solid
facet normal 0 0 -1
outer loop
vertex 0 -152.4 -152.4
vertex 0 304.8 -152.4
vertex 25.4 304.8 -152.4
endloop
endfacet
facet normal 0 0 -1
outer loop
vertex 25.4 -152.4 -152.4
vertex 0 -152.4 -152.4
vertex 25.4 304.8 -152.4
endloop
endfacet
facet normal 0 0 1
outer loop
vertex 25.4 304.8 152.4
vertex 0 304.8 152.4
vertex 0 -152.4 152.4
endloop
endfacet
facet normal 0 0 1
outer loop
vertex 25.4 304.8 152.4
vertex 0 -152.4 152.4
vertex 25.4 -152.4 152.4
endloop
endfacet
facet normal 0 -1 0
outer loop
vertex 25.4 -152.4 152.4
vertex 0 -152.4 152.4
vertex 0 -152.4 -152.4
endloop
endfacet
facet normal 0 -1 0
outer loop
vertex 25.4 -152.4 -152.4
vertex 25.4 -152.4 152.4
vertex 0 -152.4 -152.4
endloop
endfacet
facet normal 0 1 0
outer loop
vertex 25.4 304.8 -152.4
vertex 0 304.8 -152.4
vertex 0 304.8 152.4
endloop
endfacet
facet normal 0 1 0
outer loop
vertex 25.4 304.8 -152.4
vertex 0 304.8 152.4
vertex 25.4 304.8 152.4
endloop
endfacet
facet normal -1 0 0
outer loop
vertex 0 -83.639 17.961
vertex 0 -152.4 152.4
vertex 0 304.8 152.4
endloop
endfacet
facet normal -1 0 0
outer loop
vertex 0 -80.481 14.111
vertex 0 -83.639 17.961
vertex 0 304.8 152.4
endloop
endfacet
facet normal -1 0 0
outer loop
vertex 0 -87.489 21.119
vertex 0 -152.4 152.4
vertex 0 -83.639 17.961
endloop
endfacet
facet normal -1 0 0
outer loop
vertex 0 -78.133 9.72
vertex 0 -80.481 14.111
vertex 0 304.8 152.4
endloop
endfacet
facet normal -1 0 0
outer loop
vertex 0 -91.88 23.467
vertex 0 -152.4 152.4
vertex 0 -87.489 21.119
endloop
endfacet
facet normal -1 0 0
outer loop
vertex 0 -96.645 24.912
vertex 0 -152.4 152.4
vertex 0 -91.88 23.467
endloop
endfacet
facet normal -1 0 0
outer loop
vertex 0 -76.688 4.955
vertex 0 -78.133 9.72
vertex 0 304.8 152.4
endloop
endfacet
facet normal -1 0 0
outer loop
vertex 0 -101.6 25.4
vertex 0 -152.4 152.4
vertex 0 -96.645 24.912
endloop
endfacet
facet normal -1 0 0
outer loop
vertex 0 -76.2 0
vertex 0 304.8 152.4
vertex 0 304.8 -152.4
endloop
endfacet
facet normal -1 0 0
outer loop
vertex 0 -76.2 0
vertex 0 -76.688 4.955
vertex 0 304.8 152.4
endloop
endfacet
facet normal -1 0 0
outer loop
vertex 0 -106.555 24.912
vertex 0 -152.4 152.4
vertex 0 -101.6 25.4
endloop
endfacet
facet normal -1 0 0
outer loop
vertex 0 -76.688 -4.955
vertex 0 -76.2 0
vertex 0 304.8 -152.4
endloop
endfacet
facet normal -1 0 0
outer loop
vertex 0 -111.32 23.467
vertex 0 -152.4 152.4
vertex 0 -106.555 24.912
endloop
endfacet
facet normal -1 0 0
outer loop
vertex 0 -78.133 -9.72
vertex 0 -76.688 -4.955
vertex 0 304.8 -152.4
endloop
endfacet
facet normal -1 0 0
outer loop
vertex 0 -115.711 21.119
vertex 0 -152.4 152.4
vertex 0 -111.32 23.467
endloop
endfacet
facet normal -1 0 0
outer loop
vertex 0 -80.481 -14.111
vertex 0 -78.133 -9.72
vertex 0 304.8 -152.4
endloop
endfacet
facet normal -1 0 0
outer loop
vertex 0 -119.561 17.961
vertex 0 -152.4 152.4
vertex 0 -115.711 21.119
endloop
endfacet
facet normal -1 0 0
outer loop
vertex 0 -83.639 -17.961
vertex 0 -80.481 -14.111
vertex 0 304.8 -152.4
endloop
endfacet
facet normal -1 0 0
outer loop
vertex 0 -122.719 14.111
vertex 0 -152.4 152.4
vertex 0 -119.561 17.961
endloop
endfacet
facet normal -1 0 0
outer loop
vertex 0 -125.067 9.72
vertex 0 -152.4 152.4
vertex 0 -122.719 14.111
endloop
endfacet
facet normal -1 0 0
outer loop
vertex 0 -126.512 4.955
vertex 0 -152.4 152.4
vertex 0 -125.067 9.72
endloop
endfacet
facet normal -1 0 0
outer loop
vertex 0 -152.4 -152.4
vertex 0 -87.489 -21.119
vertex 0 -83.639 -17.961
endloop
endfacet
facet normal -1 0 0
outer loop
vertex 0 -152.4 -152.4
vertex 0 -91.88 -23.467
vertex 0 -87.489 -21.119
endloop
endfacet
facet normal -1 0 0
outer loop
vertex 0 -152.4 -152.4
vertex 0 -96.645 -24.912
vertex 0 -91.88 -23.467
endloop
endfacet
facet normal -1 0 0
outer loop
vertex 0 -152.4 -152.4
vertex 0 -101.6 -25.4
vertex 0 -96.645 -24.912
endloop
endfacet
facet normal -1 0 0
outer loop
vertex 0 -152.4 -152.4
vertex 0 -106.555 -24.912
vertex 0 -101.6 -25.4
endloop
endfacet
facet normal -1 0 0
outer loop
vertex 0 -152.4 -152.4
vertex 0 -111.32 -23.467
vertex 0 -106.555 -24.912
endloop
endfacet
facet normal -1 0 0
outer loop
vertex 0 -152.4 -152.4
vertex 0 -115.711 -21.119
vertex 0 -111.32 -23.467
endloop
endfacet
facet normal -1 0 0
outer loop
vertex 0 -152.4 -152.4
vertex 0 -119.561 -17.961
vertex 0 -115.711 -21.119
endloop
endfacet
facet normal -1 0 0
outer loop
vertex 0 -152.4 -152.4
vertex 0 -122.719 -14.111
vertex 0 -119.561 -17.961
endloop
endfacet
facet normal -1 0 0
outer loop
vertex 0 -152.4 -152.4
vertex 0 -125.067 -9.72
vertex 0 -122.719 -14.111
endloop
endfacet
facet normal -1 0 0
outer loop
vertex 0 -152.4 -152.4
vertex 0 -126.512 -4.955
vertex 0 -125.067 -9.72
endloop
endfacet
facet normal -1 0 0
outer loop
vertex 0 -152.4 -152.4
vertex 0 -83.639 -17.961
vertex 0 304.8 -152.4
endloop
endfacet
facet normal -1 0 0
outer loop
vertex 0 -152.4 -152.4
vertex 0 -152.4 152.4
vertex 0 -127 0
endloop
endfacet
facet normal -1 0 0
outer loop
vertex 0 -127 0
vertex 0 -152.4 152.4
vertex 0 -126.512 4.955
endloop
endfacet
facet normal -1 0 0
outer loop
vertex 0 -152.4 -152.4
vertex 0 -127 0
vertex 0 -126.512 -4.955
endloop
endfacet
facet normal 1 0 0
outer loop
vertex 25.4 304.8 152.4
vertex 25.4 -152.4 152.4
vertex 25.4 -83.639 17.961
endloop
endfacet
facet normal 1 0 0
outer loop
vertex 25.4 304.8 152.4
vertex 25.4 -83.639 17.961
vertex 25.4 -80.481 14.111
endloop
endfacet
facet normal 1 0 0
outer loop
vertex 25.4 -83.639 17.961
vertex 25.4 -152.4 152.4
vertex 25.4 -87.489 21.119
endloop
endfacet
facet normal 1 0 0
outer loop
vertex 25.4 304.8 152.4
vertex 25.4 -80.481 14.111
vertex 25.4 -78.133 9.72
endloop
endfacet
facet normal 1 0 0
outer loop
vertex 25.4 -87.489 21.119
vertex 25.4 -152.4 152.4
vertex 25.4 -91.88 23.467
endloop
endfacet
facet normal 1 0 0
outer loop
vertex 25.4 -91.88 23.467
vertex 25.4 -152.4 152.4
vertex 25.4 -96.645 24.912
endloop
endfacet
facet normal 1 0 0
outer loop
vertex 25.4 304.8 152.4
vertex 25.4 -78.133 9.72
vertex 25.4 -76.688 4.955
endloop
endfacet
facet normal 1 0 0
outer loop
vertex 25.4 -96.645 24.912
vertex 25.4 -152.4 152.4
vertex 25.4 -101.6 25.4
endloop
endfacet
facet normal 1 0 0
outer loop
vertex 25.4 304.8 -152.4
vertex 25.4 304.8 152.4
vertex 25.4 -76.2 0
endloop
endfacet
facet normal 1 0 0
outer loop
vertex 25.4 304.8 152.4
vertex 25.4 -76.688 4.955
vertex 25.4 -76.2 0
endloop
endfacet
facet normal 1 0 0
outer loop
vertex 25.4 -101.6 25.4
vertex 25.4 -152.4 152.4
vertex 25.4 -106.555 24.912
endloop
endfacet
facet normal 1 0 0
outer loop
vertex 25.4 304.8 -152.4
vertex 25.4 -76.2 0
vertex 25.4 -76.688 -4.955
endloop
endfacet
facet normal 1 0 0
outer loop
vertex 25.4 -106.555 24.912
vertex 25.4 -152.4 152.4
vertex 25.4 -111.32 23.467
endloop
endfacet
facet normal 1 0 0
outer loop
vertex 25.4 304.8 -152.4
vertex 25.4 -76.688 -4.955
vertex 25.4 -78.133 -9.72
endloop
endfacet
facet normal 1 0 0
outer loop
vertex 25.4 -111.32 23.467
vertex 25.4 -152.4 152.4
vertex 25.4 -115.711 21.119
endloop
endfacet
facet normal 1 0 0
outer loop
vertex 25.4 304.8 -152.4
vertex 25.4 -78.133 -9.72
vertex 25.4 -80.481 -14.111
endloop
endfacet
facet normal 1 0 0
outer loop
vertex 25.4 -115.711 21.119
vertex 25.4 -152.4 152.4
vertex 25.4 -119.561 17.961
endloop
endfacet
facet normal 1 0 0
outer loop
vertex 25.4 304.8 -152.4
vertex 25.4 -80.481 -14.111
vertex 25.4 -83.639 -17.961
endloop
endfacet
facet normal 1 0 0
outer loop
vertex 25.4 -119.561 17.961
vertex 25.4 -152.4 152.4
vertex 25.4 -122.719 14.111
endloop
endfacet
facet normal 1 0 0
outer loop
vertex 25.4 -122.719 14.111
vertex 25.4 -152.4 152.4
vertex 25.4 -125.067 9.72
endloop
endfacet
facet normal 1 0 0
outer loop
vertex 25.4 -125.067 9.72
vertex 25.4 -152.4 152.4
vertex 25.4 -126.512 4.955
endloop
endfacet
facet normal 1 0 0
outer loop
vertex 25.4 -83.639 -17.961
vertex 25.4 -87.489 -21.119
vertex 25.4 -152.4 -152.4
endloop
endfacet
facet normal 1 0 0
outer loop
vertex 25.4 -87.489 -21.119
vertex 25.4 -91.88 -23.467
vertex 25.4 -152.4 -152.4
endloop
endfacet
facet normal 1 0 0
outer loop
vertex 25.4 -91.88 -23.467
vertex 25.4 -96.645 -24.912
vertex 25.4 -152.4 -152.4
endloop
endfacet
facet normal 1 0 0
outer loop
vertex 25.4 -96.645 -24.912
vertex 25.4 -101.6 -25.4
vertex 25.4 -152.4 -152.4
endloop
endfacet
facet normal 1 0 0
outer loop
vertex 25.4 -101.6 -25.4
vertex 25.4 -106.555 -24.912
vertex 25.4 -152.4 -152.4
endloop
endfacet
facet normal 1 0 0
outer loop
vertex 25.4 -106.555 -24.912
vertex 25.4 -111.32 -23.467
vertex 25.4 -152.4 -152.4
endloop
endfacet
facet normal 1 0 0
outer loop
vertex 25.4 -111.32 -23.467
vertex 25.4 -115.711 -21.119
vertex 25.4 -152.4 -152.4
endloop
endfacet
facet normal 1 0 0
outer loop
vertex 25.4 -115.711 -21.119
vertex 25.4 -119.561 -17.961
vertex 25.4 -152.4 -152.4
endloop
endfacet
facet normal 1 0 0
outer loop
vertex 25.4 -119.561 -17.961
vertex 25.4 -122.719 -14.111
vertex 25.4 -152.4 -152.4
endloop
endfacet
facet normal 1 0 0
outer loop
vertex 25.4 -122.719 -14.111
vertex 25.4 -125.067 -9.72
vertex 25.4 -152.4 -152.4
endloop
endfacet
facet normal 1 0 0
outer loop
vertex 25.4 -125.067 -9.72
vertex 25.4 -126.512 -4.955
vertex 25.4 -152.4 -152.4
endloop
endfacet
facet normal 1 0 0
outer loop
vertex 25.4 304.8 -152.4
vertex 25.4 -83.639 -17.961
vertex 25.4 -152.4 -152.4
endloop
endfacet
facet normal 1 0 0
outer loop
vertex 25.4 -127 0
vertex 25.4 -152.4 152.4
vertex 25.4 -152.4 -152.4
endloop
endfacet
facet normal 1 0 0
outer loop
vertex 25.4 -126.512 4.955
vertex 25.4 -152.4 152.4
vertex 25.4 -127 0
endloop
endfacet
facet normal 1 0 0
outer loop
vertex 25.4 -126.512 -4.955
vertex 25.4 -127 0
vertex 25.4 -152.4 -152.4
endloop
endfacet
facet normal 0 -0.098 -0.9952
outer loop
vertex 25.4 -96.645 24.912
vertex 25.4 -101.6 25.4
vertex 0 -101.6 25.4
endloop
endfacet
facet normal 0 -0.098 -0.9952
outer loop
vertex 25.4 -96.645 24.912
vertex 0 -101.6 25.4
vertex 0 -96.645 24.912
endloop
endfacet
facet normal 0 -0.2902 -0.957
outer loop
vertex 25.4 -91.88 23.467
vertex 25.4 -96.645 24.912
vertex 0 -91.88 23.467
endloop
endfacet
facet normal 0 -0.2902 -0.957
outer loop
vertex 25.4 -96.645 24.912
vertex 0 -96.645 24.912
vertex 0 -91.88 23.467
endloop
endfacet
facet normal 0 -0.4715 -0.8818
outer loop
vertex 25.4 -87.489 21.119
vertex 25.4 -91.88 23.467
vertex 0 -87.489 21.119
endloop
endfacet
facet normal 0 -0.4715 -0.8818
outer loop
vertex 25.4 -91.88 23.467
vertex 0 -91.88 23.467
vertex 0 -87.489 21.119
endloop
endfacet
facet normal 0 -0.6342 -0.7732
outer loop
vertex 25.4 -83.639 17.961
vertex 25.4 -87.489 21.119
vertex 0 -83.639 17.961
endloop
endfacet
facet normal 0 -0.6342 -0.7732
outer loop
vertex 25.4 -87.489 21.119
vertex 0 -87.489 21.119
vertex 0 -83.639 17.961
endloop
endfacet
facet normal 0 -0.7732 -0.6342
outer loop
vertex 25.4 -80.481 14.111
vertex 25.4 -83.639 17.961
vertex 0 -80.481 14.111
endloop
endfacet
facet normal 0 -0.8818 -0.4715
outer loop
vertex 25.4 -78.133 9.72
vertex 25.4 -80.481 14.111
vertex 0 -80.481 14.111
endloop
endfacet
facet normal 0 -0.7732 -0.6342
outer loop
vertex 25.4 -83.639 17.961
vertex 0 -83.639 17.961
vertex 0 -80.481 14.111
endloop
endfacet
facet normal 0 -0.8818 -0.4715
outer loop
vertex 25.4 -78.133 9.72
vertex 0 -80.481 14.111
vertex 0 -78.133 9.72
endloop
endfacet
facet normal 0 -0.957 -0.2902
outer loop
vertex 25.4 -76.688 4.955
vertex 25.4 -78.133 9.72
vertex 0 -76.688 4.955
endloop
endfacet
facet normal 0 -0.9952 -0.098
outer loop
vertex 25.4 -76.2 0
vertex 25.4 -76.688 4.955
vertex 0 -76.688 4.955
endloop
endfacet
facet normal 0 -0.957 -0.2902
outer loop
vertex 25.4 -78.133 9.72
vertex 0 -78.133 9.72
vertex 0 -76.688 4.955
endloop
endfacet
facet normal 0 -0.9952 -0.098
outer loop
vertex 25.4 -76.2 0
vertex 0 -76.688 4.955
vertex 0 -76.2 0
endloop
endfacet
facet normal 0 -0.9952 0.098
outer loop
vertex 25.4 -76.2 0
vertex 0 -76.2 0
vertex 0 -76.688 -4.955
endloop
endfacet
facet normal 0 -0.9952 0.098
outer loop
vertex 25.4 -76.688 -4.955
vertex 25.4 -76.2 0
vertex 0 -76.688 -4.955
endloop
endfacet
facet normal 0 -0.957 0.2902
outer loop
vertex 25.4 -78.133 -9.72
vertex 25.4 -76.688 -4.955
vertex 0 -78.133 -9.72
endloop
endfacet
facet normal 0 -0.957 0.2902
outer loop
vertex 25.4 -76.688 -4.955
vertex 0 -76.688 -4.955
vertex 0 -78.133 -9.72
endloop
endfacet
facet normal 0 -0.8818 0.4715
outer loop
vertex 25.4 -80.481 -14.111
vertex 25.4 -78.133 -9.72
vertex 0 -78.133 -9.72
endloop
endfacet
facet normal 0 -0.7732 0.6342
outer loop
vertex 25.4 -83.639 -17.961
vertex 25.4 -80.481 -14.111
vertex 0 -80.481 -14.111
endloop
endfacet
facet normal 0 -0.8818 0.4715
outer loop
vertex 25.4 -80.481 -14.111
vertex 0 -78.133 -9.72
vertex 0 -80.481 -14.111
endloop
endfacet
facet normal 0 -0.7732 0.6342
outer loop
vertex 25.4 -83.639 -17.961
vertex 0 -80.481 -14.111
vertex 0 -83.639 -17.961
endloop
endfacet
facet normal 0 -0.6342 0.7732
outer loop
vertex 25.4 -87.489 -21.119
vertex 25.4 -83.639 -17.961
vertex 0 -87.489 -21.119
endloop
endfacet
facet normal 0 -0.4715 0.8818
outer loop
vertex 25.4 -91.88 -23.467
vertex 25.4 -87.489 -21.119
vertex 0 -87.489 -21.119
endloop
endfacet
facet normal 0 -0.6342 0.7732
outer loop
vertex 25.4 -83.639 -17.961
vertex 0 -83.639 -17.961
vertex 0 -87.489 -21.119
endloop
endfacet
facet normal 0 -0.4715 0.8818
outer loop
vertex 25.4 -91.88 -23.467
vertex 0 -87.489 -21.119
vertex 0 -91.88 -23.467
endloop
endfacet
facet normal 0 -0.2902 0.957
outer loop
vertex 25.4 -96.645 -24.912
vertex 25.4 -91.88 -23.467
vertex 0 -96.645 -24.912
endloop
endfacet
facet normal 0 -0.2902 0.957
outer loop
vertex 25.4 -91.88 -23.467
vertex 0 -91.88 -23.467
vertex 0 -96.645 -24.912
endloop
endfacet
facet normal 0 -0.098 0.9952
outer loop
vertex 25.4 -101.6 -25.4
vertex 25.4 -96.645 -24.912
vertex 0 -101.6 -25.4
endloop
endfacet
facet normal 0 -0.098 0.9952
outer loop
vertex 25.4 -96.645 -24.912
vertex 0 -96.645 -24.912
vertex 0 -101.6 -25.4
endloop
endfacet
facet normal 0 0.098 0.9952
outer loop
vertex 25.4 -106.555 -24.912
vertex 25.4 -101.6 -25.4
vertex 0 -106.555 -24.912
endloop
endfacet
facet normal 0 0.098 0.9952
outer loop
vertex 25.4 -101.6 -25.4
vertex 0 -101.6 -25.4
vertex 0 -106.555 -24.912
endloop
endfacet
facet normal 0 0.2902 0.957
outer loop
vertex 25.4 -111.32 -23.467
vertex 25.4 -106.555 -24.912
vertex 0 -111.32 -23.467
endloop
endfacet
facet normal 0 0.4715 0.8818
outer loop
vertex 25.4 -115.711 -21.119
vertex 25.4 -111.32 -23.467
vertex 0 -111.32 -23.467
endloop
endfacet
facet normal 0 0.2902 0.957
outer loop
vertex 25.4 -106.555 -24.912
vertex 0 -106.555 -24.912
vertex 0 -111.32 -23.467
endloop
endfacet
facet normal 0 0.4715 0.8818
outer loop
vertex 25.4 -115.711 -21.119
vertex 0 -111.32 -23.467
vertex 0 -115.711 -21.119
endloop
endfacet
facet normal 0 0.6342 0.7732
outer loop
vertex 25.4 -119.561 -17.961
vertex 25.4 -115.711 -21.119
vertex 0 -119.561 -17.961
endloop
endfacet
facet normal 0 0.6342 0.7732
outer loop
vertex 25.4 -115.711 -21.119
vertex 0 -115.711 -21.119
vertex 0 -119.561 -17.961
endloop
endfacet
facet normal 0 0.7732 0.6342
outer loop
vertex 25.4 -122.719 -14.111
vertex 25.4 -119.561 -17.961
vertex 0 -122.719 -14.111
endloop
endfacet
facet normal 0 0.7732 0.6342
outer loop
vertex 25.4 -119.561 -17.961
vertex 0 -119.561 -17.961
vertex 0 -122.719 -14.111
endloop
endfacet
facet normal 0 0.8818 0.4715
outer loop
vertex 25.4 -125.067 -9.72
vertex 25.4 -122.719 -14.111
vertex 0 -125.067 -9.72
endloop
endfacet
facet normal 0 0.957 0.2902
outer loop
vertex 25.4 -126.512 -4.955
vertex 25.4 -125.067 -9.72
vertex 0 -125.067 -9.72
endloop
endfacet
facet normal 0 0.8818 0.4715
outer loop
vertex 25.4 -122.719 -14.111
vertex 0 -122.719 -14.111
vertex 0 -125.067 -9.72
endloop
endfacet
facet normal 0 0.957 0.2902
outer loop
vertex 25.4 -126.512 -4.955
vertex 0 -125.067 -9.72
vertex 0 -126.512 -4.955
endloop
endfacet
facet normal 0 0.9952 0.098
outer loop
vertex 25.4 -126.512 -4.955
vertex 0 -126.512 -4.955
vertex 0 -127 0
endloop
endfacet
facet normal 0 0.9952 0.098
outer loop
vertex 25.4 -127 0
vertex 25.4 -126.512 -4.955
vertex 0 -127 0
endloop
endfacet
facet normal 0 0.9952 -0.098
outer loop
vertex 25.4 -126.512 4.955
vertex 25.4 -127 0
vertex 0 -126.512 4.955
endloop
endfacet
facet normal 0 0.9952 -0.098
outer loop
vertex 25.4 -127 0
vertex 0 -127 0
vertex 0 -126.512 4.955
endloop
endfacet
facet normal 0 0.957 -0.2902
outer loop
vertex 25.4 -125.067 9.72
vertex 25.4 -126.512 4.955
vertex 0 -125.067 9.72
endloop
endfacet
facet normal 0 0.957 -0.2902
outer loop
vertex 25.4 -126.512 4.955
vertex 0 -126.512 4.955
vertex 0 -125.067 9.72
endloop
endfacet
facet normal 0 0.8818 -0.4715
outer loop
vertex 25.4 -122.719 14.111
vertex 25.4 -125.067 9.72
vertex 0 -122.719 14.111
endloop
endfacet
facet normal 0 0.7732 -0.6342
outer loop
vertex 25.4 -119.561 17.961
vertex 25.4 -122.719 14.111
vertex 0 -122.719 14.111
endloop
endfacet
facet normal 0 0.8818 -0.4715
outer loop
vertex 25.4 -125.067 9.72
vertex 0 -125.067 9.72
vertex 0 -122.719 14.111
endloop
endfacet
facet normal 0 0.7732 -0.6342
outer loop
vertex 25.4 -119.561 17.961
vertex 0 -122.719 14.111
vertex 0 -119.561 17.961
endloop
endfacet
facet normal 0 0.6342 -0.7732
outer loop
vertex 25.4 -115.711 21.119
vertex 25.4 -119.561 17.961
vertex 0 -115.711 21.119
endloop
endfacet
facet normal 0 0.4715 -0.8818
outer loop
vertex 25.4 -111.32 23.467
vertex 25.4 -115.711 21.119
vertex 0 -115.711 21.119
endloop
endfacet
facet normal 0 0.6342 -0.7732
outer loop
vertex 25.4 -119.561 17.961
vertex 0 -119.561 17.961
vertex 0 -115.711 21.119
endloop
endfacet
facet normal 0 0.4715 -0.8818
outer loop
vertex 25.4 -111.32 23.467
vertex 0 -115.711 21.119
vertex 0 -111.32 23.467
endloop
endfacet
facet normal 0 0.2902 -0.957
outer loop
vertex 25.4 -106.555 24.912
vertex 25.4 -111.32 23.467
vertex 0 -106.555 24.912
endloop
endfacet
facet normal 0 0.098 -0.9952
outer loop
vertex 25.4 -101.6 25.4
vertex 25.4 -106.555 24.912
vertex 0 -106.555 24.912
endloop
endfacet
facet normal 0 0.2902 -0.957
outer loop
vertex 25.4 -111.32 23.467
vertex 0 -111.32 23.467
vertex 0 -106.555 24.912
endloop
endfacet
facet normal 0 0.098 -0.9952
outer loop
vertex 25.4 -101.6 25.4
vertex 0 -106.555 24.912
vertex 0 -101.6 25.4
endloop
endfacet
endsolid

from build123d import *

# Parameters (mm, degrees)
SKETCH1_W           = 304.8
SKETCH1_H           = 304.8
BOSS_EXTRUDE1_DEPTH = 25.4
SKETCH2_R           = 25.4
CUT_EXTRUDE1_DEPTH  = 25.4
SKETCH3_W           = 25.4
SKETCH3_H           = 304.8
BOSS_EXTRUDE2_DEPTH = 152.4


with BuildPart() as part:
    # Sketch1 → Boss-Extrude1 (new body)
    with BuildSketch(Plane(origin=(0, 0, 0), x_dir=(0, 0, -1), z_dir=(1, 0, 0))):
        Rectangle(SKETCH1_W, SKETCH1_H)
    extrude(amount=BOSS_EXTRUDE1_DEPTH)

    # Sketch2 → Cut-Extrude1 (cut)
    with BuildSketch(Plane.ZY):
        with Locations((0, -101.6)):
            Circle(SKETCH2_R)
    extrude(amount=-CUT_EXTRUDE1_DEPTH, mode=Mode.SUBTRACT)

    # Sketch3 → Boss-Extrude2 (add)
    with BuildSketch(Plane(origin=(0, 152.4, 0), x_dir=(1, 0, 0), z_dir=(0, 1, 0))):
        with Locations((12.7, 0)):
            Rectangle(SKETCH3_W, SKETCH3_H)
    extrude(amount=BOSS_EXTRUDE2_DEPTH)


solid = part.part
